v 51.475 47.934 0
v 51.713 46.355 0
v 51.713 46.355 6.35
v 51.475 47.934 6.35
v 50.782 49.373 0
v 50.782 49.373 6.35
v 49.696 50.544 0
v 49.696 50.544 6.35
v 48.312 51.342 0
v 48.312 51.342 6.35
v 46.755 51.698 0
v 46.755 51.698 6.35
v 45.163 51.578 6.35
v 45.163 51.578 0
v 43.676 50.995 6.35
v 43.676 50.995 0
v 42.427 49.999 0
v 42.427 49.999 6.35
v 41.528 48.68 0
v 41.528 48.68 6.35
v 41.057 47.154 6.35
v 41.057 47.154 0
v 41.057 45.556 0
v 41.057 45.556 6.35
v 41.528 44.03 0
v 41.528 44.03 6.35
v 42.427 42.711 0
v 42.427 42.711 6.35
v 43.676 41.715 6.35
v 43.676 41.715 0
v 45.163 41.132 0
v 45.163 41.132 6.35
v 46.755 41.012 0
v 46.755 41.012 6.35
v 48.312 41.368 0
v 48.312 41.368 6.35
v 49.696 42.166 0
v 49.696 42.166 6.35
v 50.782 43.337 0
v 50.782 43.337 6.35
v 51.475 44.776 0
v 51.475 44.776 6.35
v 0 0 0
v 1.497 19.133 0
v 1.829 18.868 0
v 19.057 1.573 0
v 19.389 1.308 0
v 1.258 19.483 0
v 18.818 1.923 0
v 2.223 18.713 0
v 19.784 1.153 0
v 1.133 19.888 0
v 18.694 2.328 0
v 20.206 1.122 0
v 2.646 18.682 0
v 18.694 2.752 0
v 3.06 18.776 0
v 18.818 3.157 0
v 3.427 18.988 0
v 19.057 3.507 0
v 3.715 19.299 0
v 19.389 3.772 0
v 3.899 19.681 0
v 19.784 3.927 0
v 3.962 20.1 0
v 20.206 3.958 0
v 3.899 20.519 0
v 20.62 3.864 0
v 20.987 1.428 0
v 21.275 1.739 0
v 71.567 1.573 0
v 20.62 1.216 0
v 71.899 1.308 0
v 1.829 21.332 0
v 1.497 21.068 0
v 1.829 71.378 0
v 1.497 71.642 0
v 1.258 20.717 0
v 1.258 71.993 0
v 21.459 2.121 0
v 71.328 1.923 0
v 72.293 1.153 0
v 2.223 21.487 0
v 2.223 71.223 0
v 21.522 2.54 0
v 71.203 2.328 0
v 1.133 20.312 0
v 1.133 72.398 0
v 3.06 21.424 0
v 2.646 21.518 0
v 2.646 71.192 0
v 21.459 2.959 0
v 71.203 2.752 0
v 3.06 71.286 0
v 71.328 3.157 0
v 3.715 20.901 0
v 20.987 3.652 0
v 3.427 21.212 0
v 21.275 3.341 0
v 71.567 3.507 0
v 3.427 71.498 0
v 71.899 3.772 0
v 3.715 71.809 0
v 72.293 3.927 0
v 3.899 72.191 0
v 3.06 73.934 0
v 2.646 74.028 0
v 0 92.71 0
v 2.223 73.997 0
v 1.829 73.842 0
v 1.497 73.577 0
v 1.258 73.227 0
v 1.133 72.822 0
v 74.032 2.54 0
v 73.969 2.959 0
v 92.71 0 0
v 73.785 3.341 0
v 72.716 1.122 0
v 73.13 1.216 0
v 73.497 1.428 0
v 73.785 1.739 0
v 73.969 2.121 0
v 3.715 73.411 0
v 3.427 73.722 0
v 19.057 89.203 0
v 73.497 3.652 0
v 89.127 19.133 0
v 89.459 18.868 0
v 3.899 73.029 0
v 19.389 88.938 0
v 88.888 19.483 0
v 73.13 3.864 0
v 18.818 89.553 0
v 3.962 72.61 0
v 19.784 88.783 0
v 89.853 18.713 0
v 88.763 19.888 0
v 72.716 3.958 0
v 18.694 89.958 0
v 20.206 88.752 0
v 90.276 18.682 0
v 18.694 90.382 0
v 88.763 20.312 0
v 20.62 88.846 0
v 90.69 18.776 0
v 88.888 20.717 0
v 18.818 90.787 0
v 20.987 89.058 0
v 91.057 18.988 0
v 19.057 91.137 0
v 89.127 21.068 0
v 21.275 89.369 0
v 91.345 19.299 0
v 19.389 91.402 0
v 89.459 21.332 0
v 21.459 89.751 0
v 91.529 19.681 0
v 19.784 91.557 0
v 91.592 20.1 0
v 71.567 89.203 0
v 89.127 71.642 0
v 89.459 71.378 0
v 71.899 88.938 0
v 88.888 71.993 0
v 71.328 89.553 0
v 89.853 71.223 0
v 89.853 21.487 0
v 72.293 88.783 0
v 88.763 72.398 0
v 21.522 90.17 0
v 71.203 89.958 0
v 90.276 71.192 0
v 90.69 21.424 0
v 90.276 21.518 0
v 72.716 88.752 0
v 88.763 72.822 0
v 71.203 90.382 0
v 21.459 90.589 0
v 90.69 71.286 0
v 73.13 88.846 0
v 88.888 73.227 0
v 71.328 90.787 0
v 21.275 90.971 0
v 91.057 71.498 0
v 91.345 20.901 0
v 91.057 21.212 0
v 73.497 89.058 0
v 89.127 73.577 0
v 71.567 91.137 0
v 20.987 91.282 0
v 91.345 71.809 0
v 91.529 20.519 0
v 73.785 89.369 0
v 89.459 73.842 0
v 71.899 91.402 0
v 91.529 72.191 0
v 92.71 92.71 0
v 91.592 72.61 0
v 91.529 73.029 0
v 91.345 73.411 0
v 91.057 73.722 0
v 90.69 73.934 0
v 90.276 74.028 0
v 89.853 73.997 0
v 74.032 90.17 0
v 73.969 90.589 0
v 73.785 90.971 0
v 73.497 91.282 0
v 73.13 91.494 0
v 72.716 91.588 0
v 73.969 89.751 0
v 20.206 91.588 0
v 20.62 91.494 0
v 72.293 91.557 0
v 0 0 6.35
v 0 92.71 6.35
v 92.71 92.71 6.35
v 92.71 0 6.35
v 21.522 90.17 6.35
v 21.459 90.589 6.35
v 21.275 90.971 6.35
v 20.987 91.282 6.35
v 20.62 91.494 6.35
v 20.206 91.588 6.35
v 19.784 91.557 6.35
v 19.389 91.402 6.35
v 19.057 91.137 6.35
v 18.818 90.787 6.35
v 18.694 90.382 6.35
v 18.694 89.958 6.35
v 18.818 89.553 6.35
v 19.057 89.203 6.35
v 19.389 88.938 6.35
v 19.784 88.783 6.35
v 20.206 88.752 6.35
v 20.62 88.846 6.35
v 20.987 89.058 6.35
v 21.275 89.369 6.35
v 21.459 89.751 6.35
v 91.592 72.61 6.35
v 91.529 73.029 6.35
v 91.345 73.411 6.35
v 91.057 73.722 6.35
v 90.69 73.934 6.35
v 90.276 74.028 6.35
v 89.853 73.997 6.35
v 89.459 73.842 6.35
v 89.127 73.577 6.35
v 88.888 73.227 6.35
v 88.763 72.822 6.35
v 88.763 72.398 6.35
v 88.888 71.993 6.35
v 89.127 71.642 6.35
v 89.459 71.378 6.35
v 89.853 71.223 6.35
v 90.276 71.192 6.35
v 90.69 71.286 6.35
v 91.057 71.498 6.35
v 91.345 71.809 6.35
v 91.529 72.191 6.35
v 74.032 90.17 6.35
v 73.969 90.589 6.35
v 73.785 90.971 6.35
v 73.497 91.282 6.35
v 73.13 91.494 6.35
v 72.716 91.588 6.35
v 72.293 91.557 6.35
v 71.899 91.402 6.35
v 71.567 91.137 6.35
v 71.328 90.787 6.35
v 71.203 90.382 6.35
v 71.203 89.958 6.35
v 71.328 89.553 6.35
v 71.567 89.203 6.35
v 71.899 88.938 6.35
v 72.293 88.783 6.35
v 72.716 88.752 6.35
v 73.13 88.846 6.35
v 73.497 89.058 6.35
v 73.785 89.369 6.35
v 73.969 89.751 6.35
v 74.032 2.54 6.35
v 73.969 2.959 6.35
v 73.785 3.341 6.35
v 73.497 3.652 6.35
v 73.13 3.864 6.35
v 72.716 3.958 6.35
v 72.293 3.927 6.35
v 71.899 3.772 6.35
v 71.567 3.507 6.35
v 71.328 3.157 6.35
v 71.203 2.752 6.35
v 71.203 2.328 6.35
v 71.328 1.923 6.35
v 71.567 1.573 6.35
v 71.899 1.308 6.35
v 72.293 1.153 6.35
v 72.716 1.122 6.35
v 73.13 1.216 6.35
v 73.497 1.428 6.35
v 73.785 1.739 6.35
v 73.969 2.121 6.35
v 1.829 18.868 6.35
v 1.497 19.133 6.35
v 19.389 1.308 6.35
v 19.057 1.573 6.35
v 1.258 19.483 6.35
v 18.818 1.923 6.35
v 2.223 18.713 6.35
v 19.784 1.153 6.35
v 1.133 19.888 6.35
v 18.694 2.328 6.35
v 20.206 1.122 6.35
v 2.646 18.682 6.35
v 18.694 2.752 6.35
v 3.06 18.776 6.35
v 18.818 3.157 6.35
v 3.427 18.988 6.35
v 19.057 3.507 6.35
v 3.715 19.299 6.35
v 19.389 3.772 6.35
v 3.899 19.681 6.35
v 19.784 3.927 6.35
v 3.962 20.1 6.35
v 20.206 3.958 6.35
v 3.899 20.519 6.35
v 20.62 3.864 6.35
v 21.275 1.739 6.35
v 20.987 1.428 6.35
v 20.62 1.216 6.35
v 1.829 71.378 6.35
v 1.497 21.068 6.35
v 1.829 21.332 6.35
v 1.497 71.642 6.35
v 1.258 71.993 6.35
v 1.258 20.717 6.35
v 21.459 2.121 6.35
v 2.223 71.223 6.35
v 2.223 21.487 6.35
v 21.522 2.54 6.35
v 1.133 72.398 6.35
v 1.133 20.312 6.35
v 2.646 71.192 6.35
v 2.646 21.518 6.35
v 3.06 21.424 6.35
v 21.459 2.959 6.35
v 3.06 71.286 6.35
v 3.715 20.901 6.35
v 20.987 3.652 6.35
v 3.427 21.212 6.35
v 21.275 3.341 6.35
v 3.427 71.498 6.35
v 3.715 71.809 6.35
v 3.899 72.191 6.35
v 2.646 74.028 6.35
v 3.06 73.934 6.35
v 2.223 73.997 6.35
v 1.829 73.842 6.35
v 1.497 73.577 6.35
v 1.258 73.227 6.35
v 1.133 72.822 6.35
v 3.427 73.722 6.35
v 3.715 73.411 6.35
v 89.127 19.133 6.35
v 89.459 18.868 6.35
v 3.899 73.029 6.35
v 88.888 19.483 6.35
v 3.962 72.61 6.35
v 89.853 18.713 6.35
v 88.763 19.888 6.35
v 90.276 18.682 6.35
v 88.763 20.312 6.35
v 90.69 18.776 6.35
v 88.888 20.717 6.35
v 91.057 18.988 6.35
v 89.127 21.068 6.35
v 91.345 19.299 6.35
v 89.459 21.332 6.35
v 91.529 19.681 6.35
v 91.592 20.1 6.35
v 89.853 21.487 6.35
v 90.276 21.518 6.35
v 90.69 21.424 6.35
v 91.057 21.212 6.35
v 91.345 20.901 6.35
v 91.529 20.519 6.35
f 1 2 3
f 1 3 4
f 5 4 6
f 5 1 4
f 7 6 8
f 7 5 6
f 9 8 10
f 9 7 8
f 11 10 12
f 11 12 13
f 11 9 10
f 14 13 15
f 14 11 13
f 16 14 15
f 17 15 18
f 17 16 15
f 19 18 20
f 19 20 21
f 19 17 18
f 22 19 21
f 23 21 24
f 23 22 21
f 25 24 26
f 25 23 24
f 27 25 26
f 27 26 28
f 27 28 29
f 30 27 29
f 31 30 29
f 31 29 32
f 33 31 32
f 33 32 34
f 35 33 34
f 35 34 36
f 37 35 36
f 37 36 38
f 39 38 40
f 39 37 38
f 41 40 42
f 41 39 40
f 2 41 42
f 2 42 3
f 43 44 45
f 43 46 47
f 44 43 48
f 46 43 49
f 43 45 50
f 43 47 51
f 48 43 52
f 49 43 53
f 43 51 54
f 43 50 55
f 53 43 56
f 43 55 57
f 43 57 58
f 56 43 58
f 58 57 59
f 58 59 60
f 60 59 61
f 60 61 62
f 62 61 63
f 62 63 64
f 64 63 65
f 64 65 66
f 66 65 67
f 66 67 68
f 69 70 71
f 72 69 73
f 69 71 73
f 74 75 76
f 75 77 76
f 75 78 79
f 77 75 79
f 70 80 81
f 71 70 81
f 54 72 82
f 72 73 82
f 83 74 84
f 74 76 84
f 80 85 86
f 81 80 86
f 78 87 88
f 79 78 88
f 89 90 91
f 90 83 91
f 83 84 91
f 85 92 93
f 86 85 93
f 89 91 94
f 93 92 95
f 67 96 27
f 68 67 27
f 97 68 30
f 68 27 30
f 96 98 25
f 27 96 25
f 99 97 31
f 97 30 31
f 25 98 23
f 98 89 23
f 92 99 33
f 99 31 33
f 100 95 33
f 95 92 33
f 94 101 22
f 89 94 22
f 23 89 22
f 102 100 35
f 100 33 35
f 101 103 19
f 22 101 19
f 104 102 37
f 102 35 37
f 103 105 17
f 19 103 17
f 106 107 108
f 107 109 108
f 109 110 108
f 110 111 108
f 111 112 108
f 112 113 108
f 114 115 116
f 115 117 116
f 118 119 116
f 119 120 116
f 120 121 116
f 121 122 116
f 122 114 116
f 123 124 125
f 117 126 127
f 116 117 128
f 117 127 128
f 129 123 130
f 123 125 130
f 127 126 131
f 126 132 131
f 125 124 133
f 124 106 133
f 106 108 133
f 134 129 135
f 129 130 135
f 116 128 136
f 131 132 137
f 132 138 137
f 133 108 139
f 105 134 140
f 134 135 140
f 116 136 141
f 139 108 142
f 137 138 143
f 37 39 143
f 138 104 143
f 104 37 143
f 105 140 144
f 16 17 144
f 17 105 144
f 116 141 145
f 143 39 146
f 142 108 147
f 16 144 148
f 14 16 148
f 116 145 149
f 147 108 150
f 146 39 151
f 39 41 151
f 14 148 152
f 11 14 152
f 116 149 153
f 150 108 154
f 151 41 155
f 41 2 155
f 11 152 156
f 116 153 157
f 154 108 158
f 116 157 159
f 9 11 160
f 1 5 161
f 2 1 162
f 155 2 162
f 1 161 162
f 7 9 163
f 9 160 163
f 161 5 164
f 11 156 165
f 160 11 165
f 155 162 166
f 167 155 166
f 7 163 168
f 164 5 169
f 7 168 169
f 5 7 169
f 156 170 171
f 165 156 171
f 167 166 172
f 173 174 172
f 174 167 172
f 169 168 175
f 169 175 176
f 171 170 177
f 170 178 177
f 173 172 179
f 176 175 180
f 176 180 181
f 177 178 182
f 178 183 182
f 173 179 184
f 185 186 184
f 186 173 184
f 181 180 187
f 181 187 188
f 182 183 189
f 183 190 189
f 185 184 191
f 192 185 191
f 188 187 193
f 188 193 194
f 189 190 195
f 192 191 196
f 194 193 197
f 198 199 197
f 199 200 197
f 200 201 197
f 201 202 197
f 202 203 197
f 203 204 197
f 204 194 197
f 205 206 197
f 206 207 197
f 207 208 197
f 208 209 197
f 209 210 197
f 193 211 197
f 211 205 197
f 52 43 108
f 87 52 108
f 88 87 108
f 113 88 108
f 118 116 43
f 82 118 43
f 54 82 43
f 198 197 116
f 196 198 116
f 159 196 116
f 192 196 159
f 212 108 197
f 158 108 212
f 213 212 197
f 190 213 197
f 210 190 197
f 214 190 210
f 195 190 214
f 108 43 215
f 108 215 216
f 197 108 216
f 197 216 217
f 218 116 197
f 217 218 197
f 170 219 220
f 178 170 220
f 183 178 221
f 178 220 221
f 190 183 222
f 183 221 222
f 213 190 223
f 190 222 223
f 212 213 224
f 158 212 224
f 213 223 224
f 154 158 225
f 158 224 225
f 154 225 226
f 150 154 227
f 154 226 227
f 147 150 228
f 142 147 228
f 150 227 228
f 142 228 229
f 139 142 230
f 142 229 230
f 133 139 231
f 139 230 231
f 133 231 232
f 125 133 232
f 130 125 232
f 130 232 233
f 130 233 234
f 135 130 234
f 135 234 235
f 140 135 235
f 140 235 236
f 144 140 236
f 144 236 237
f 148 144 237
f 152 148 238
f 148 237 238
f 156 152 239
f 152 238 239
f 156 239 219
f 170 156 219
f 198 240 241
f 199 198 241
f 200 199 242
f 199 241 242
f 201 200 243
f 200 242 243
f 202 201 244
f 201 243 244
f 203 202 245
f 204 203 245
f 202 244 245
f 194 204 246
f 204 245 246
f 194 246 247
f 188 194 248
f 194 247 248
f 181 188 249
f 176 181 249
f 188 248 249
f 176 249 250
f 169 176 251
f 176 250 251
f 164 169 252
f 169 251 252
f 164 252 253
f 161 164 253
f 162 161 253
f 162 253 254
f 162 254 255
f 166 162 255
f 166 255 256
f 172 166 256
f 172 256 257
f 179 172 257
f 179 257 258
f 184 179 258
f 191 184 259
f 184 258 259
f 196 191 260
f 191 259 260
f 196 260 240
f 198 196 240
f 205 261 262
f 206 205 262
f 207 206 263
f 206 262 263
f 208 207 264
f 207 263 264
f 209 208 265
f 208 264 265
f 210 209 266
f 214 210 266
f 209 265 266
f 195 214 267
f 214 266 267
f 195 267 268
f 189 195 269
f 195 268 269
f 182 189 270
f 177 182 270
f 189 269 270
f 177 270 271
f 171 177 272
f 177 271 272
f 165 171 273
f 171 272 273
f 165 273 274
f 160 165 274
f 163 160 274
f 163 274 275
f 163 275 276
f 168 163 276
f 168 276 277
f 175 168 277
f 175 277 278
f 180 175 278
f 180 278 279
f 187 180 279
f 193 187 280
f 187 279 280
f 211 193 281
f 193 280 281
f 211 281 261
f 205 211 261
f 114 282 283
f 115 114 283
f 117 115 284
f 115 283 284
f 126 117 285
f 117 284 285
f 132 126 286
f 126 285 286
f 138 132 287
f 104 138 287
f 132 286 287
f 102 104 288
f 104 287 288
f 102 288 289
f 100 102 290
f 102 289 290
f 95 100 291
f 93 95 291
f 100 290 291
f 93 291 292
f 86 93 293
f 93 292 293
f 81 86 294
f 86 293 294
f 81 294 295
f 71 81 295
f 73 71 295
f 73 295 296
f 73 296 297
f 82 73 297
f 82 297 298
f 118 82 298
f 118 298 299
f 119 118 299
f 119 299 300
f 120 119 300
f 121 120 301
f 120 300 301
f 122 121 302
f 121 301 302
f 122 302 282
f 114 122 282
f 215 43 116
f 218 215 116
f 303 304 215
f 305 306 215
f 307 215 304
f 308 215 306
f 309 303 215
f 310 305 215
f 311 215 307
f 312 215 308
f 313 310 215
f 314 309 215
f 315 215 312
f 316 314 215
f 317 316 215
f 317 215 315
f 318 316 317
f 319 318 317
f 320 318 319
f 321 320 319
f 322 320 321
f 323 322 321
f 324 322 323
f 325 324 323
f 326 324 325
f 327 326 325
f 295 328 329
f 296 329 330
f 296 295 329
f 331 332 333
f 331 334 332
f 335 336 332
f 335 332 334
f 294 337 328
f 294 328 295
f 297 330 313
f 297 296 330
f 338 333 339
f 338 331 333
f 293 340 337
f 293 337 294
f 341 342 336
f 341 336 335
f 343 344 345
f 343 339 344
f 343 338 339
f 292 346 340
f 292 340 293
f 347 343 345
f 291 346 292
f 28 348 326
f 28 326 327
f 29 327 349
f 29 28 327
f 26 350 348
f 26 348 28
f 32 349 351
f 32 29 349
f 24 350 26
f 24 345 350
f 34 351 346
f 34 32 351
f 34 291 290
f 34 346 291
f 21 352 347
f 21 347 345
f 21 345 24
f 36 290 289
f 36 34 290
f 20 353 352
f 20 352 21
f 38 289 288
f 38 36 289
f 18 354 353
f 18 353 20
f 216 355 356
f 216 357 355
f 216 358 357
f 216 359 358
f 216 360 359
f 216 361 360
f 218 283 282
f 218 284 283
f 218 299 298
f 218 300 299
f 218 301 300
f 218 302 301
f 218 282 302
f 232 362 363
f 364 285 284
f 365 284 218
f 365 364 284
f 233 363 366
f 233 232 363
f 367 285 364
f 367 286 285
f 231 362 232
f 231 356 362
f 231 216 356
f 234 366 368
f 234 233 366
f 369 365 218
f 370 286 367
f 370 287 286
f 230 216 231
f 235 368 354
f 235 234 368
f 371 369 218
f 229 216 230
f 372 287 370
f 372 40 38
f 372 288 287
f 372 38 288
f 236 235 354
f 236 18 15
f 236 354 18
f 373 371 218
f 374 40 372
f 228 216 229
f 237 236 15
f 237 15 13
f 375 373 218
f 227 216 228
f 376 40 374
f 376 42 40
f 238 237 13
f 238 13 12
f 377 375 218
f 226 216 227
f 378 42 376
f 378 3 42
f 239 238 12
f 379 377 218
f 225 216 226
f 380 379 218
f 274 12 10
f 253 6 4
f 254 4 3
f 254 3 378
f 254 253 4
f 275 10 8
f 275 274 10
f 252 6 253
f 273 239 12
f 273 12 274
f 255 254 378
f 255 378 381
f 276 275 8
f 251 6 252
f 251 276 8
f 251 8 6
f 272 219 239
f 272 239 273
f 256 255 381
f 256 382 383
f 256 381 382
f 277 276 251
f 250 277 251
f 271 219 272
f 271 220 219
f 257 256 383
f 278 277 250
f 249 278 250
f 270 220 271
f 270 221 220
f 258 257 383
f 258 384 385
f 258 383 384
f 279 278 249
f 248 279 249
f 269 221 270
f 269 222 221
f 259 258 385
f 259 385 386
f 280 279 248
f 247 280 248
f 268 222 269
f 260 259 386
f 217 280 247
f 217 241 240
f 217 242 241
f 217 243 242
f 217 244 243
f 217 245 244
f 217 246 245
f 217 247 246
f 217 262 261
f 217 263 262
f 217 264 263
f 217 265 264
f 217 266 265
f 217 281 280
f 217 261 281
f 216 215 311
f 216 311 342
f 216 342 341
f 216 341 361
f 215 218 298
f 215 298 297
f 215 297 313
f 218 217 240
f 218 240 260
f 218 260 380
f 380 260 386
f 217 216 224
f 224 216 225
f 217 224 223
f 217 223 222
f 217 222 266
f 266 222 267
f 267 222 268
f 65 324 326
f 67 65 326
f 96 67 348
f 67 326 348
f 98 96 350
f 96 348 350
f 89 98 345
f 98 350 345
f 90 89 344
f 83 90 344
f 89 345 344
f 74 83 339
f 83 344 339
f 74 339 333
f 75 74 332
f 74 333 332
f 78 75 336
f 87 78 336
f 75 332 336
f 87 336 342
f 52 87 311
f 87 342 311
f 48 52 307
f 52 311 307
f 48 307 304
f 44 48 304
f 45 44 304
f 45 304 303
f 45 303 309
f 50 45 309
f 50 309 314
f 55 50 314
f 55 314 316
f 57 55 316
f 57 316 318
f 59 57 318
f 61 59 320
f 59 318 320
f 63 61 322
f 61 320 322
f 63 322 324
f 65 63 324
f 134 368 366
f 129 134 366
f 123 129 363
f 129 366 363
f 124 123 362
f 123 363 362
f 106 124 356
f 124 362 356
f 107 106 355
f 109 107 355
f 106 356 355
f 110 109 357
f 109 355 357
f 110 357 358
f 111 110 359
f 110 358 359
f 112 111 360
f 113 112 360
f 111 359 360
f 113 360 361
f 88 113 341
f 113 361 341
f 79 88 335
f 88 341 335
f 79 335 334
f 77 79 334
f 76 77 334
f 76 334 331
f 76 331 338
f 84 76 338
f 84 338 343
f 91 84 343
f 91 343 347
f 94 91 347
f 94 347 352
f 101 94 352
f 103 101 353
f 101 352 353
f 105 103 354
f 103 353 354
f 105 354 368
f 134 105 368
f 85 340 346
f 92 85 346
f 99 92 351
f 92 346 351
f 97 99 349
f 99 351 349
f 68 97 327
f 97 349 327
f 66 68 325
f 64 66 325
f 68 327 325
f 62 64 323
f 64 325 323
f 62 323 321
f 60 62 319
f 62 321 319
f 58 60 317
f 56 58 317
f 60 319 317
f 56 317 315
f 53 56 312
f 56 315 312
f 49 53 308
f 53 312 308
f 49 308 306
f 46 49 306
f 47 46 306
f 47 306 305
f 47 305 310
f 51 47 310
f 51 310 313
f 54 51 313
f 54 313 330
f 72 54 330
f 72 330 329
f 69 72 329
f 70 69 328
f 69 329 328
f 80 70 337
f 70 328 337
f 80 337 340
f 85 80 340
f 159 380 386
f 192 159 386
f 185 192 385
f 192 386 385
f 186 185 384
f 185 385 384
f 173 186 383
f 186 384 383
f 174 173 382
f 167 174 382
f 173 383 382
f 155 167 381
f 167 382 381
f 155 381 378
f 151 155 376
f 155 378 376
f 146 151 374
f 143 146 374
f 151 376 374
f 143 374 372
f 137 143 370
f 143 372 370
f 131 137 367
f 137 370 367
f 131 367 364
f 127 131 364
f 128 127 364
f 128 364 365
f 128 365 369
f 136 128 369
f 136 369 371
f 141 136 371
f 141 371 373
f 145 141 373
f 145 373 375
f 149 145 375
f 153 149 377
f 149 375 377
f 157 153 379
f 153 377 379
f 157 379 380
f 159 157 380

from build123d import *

# Parameters (mm, degrees)
SKETCH1_W           = 92.71
SKETCH1_H           = 92.71
SKETCH1_R           = 5.3578125
BOSS_EXTRUDE1_DEPTH = 6.35
SKETCH2_R           = 1.4224
CUT_EXTRUDE1_DEPTH  = 6.35


with BuildPart() as part:
    # Sketch1 → Boss-Extrude1 (new body)
    with BuildSketch(Plane.XY):
        with Locations((46.355, 46.355)):
            Rectangle(SKETCH1_W, SKETCH1_H)
        with Locations((46.355, 46.355)):
            Circle(SKETCH1_R, mode=Mode.SUBTRACT)
    extrude(amount=BOSS_EXTRUDE1_DEPTH)

    # Sketch2 → Cut-Extrude1 (cut)
    with BuildSketch(Plane.XY.offset(6.35)):
        with Locations((2.54, 20.100036)):
            Circle(SKETCH2_R)
        with Locations((20.100036, 2.54)):
            Circle(SKETCH2_R)
        with Locations((72.609964, 2.54)):
            Circle(SKETCH2_R)
        with Locations((90.17, 20.100036)):
            Circle(SKETCH2_R)
        with Locations((90.17, 72.609964)):
            Circle(SKETCH2_R)
        with Locations((72.609964, 90.17)):
            Circle(SKETCH2_R)
        with Locations((20.100036, 90.17)):
            Circle(SKETCH2_R)
        with Locations((2.54, 72.609964)):
            Circle(SKETCH2_R)
    extrude(amount=-CUT_EXTRUDE1_DEPTH, mode=Mode.SUBTRACT)


solid = part.part
